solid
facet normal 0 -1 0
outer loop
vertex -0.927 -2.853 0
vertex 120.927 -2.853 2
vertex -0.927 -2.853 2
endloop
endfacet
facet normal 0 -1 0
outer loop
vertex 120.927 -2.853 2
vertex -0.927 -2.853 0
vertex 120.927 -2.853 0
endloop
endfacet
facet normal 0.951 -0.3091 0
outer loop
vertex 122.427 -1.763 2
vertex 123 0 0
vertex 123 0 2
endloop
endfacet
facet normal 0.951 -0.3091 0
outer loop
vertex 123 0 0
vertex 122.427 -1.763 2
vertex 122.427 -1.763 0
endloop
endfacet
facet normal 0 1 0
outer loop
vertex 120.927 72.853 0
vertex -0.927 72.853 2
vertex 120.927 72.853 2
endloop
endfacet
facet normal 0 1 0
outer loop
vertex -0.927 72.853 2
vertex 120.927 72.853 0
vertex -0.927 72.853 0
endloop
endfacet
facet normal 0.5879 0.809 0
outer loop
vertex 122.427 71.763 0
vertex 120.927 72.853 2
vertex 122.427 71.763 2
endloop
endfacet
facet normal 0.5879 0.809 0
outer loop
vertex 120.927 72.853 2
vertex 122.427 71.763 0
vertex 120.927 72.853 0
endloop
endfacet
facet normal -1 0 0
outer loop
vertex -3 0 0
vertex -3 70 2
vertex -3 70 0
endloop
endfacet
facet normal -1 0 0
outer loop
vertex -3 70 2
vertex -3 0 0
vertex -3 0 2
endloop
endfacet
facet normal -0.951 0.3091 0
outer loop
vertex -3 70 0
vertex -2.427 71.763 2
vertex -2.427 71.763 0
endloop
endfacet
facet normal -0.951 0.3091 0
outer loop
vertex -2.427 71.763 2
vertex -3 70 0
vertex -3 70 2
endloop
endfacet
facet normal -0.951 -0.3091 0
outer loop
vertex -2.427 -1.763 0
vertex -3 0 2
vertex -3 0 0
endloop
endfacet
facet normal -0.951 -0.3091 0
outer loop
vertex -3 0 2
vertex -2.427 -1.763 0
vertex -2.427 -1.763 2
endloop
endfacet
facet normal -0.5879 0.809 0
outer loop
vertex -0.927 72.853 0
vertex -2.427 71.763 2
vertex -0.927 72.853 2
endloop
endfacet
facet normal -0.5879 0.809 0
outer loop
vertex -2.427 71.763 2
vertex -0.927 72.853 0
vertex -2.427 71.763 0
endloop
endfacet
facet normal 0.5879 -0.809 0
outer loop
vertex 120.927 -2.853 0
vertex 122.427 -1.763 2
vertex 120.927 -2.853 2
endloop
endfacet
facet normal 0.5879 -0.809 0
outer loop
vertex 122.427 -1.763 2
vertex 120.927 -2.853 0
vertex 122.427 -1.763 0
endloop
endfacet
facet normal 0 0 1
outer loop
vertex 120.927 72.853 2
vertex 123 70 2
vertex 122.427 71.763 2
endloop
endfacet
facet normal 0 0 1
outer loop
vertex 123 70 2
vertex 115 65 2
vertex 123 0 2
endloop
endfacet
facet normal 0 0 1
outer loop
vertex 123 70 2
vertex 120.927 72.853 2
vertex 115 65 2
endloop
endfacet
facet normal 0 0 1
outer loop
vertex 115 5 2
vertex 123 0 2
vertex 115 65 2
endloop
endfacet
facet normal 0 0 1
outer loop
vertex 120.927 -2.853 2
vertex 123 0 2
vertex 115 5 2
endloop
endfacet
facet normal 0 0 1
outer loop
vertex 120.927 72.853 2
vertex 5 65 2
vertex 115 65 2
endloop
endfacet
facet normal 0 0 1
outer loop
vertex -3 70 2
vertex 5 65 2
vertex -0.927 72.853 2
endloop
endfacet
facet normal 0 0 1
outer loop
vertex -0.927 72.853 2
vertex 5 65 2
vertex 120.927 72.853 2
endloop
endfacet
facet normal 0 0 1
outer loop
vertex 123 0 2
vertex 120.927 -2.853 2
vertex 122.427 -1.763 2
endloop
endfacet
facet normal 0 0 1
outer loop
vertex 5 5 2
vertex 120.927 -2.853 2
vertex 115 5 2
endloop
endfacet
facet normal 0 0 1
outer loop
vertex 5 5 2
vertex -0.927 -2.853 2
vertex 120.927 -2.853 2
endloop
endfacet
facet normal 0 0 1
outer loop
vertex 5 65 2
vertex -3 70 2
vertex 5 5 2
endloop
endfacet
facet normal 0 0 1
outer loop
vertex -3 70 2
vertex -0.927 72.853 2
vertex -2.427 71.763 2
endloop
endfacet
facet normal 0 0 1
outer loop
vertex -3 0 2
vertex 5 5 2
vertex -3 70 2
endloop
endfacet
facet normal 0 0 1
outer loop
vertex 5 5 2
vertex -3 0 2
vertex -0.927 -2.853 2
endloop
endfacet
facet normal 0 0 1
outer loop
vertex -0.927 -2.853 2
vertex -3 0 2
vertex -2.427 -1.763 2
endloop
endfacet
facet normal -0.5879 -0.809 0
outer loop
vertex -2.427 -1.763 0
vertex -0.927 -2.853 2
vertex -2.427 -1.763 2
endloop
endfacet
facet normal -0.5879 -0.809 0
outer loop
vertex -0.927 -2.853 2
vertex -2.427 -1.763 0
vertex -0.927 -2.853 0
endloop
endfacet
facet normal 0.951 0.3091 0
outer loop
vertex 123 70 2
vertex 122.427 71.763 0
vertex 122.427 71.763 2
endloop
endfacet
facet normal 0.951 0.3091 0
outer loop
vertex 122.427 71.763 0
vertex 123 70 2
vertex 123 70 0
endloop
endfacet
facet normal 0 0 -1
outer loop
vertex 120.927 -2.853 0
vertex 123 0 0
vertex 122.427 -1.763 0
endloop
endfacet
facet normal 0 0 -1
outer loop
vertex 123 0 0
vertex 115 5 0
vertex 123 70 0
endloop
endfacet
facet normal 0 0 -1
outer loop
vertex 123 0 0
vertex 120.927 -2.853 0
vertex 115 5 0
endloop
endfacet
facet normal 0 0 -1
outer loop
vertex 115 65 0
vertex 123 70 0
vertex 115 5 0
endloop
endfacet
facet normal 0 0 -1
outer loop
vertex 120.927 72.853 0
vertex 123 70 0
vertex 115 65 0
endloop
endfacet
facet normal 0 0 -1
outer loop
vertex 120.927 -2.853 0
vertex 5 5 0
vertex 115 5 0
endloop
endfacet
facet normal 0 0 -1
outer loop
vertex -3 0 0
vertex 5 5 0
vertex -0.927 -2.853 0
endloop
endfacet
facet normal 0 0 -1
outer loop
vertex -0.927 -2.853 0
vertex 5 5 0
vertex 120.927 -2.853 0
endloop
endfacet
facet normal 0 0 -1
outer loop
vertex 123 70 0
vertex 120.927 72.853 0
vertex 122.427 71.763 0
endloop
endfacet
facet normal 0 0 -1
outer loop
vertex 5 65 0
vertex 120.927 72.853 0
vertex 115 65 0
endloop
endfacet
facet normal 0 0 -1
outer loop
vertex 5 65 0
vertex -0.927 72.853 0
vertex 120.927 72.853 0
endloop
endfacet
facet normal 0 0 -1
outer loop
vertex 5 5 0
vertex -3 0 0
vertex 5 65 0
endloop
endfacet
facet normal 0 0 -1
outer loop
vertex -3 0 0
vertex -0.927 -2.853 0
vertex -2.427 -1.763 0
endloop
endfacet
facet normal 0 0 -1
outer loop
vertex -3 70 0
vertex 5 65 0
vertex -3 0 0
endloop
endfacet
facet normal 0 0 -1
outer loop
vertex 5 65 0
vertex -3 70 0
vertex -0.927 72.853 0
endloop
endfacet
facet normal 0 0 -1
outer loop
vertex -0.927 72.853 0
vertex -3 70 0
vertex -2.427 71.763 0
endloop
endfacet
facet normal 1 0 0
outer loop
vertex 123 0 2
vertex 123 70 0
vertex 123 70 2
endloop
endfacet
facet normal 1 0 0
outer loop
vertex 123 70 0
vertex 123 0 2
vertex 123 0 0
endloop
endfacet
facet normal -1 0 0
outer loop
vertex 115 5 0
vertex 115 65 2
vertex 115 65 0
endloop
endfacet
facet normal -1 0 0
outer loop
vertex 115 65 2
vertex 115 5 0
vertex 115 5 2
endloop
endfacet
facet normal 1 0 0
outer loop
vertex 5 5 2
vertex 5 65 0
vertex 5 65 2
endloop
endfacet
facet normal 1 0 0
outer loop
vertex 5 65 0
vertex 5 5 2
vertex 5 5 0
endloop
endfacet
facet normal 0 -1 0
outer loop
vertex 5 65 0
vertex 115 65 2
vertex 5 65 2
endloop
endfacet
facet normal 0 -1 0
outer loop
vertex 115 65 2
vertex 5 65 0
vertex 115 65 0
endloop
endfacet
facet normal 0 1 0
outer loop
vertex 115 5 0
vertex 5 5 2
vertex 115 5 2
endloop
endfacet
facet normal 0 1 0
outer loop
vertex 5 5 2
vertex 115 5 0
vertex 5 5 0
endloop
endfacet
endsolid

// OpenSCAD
//length = 120;
//width = 70;
//framewidth = 10;
//thickness = 6;
holesize = 3;
supportwidth = 3;

module clusterplate(length=120,width=70,framewidth=10,thickness=6)
union()
{
    //difference()
    //{
        //minkowski()
        //{
        //    cube([length,width,1]);
        //    cylinder(r=3,h=1);
        //}
        
        //translate([framewidth/2,framewidth/2,-thickness/2]) rotate([0,0,0]) color("blue") cube([length-framewidth,width-framewidth,thickness]);
        //translate([0,0,-0.5*thickness])
        //linear_extrude(height = thickness*2, center = true) 
        //{
        //    grate(length, width, holesize, supportwidth) polygon([[0,holesize],[2*holesize,0],[0,-holesize],[-2*holesize,0]]);
        //}
    //}
    difference()
    {
        minkowski()
        {
            cube([length,width,1]);
            cylinder(r=3,h=1);
        }
        translate([framewidth/2,framewidth/2,-thickness/2]) rotate([0,0,0]) cube([length-framewidth,width-framewidth,thickness]);
    }
}


module grate(length, width, holesize, supportwidth)
{
    frame = 0;
    countx = (length-2*frame)/(2*holesize+supportwidth);
    for(x = [0 : countx-1])
    {
        county = (width-2*frame)/(holesize);
        for(y = [0 : county-1])
        {
            if (y % 2 == 0)
            {
                translate([2*frame + (4*holesize+supportwidth)/2 + x*4*holesize+x*supportwidth,frame+1.5*y*holesize,0]) children();
            }
            else
            {
                translate([2*frame + x*4*holesize+x*supportwidth,frame+1.5*y*holesize,0]) children();
            }
        }
    }
}

clusterplate();
